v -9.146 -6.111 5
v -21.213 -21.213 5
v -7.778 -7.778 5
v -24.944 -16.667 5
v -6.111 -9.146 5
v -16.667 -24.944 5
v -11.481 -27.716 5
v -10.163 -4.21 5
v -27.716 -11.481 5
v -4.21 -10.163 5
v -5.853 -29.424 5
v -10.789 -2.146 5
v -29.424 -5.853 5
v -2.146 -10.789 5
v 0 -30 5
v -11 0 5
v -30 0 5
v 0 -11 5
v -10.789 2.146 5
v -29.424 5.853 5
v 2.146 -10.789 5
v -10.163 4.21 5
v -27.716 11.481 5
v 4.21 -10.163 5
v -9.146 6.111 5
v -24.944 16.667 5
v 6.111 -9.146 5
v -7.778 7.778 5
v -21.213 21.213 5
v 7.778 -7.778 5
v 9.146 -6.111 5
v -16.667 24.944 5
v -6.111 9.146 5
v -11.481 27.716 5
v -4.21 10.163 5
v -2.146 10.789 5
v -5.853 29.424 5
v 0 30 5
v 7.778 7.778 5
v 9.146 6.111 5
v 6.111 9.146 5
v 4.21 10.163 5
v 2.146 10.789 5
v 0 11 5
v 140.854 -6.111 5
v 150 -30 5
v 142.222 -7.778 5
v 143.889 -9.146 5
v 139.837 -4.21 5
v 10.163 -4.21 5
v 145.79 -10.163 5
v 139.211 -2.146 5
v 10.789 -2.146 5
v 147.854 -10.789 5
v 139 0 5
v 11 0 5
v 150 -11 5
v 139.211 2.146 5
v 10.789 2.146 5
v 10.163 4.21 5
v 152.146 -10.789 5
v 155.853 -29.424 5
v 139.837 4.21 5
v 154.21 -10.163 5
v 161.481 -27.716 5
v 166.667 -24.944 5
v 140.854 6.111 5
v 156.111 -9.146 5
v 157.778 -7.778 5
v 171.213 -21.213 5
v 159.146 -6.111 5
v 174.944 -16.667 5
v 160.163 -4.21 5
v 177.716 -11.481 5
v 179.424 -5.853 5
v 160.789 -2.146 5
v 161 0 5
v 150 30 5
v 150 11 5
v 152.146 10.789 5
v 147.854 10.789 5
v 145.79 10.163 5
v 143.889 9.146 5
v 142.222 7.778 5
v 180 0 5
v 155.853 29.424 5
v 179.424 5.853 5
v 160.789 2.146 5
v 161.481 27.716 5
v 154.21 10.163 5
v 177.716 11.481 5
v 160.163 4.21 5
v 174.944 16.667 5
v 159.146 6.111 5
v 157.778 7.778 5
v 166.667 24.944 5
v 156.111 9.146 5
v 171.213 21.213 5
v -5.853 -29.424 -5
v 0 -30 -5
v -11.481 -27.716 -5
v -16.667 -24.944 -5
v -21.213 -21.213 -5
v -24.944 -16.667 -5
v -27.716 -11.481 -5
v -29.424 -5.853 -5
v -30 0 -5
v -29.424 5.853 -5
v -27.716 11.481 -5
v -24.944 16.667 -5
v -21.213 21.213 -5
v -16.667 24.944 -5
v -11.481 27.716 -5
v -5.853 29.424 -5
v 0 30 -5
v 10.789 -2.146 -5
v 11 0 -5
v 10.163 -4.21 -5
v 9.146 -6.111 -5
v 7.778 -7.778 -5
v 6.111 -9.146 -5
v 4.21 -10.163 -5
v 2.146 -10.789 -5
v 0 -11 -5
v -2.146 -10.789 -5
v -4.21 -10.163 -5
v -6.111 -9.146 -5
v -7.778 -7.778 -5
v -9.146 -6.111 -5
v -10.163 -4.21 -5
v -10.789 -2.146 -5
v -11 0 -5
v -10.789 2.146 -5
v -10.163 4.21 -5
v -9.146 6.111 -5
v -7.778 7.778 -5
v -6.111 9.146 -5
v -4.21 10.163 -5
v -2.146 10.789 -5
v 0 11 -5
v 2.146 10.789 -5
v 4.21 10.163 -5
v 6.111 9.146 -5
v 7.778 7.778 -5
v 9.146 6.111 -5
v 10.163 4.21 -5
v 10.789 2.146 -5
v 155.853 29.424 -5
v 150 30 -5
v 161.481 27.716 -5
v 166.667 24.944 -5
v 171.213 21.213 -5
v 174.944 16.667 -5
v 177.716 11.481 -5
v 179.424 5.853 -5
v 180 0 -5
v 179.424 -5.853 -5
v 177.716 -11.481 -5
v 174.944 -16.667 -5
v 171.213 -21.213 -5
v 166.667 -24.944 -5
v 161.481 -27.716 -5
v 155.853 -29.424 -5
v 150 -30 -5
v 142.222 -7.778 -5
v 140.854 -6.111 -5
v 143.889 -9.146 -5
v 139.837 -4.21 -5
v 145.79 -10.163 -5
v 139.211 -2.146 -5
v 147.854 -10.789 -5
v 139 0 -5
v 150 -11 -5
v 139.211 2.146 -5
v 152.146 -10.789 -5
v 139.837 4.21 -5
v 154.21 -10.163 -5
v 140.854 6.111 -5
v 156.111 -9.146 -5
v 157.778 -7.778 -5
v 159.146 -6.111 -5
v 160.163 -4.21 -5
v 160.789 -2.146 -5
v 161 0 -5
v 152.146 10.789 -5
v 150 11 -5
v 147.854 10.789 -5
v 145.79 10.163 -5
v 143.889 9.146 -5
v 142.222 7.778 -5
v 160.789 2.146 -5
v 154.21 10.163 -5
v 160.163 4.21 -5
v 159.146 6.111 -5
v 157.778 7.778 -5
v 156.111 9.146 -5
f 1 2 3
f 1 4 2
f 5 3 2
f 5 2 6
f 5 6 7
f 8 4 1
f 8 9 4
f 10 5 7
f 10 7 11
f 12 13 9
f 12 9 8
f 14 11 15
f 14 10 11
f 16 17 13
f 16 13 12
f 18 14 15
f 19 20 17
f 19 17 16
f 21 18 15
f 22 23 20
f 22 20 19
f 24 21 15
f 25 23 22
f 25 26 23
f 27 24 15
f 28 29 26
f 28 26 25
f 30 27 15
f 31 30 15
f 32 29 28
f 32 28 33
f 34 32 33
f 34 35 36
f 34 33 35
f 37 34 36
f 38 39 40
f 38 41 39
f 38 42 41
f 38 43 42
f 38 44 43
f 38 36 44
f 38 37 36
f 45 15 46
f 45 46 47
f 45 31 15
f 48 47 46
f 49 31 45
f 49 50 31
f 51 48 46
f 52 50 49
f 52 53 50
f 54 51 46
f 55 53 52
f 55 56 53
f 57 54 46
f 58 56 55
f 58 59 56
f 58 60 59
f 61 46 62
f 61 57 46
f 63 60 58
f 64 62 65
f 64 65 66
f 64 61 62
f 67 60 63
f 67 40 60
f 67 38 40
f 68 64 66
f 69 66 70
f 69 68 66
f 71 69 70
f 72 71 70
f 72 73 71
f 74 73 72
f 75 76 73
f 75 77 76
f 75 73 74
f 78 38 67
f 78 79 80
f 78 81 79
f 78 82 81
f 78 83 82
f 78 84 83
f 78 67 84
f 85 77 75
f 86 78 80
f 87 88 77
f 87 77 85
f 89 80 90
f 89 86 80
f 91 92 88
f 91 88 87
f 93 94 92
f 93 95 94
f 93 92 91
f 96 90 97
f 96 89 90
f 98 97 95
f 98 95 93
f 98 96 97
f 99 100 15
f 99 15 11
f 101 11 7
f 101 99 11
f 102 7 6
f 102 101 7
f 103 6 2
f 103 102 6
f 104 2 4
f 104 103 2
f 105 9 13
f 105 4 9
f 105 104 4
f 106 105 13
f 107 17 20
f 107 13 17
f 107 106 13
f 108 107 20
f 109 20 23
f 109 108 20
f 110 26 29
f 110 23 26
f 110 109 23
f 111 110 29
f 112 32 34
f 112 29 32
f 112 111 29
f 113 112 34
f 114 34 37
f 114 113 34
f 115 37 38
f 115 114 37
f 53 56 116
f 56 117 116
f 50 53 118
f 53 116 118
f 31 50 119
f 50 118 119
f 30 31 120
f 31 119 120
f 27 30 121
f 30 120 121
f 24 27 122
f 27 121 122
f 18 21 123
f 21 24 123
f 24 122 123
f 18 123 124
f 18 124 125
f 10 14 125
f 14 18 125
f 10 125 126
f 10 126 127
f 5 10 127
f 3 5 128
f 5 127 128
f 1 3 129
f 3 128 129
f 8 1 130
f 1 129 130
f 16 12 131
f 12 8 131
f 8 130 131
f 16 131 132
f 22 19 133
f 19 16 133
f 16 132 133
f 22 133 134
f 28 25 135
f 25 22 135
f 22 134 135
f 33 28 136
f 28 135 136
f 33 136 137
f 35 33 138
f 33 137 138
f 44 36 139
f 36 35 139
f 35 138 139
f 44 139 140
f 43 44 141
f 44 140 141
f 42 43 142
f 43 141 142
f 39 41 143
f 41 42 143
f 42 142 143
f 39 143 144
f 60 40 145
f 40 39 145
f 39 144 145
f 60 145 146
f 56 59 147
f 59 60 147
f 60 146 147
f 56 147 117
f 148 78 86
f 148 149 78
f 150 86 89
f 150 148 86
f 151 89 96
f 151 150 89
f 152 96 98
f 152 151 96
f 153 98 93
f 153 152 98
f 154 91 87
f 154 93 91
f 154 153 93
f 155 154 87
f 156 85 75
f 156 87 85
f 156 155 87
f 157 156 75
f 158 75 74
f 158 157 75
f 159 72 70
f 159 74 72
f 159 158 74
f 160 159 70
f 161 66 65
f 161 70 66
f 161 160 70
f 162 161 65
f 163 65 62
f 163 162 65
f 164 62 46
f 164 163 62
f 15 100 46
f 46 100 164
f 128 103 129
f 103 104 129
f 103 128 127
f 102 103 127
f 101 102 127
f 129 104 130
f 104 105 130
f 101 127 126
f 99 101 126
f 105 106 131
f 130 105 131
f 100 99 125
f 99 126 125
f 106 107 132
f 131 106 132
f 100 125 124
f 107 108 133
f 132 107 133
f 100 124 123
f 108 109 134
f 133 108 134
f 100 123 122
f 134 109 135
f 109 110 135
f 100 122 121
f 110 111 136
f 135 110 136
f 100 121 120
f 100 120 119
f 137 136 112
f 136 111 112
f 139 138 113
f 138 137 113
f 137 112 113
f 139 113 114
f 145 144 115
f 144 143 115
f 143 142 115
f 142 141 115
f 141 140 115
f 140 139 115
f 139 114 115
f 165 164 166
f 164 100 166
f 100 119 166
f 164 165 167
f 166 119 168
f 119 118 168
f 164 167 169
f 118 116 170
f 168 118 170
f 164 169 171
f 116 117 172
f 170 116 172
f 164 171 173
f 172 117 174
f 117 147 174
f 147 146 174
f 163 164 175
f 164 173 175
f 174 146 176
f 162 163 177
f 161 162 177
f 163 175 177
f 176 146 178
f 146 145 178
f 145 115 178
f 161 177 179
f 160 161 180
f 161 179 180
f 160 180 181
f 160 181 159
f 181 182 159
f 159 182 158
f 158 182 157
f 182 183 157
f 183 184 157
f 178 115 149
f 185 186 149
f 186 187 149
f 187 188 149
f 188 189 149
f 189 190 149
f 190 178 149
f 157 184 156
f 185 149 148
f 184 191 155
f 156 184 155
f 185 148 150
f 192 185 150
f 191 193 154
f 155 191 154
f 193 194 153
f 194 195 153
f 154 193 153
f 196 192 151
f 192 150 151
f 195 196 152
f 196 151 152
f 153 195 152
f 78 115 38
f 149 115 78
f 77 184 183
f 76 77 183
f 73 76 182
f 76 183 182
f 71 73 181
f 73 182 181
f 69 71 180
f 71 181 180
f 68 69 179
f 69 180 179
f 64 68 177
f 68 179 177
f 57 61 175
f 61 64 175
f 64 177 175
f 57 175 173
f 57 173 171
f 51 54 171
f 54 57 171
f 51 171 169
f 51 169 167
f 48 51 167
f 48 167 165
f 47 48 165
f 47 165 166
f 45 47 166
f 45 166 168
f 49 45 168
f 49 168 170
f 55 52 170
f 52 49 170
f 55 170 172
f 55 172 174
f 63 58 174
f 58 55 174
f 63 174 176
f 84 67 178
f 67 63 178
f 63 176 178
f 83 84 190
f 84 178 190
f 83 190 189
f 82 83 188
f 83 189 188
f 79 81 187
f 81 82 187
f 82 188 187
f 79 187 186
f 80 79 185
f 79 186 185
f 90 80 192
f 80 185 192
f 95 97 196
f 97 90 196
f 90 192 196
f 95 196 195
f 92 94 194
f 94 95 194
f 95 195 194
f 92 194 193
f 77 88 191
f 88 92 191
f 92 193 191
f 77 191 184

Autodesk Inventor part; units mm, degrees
ref_plane "YZ Plane" through (0, 0, 0) normal (1, 0, 0) x (0, 1, 0)
ref_plane "XZ Plane" through (0, 0, 0) normal (0, 1, 0) x (-1, 0, 0)
ref_plane "XY Plane" through (0, 0, 0) normal (0, 0, 1) x (1, 0, 0)
sketch "Sketch1" plane through (0, 0, 0) normal (0, 0, 1) x (1, 0, 0)
  circle A0 centre (0, 0) radius 11
  arc A1 (0, 30) -> (0, -30) centre (0, 0) ccw
  line L0 (0, 30) -> (150, 30)
  circle A2 centre (150, 0) radius 11
  line L1 (0, -30) -> (150, -30)
  arc A3 (150, -30) -> (150, 30) centre (150, 0) ccw
  dimension "d0" = 22
  dimension "d1" = 30
  dimension "d2" = 150
  dimension "d3" = 22
  dimension "d6" = 150
extrude "Extrusion1" add sketch "Sketch1" along normal mid plane 10
equation "\"d6\" = d2"
properties part number "Suporte"
